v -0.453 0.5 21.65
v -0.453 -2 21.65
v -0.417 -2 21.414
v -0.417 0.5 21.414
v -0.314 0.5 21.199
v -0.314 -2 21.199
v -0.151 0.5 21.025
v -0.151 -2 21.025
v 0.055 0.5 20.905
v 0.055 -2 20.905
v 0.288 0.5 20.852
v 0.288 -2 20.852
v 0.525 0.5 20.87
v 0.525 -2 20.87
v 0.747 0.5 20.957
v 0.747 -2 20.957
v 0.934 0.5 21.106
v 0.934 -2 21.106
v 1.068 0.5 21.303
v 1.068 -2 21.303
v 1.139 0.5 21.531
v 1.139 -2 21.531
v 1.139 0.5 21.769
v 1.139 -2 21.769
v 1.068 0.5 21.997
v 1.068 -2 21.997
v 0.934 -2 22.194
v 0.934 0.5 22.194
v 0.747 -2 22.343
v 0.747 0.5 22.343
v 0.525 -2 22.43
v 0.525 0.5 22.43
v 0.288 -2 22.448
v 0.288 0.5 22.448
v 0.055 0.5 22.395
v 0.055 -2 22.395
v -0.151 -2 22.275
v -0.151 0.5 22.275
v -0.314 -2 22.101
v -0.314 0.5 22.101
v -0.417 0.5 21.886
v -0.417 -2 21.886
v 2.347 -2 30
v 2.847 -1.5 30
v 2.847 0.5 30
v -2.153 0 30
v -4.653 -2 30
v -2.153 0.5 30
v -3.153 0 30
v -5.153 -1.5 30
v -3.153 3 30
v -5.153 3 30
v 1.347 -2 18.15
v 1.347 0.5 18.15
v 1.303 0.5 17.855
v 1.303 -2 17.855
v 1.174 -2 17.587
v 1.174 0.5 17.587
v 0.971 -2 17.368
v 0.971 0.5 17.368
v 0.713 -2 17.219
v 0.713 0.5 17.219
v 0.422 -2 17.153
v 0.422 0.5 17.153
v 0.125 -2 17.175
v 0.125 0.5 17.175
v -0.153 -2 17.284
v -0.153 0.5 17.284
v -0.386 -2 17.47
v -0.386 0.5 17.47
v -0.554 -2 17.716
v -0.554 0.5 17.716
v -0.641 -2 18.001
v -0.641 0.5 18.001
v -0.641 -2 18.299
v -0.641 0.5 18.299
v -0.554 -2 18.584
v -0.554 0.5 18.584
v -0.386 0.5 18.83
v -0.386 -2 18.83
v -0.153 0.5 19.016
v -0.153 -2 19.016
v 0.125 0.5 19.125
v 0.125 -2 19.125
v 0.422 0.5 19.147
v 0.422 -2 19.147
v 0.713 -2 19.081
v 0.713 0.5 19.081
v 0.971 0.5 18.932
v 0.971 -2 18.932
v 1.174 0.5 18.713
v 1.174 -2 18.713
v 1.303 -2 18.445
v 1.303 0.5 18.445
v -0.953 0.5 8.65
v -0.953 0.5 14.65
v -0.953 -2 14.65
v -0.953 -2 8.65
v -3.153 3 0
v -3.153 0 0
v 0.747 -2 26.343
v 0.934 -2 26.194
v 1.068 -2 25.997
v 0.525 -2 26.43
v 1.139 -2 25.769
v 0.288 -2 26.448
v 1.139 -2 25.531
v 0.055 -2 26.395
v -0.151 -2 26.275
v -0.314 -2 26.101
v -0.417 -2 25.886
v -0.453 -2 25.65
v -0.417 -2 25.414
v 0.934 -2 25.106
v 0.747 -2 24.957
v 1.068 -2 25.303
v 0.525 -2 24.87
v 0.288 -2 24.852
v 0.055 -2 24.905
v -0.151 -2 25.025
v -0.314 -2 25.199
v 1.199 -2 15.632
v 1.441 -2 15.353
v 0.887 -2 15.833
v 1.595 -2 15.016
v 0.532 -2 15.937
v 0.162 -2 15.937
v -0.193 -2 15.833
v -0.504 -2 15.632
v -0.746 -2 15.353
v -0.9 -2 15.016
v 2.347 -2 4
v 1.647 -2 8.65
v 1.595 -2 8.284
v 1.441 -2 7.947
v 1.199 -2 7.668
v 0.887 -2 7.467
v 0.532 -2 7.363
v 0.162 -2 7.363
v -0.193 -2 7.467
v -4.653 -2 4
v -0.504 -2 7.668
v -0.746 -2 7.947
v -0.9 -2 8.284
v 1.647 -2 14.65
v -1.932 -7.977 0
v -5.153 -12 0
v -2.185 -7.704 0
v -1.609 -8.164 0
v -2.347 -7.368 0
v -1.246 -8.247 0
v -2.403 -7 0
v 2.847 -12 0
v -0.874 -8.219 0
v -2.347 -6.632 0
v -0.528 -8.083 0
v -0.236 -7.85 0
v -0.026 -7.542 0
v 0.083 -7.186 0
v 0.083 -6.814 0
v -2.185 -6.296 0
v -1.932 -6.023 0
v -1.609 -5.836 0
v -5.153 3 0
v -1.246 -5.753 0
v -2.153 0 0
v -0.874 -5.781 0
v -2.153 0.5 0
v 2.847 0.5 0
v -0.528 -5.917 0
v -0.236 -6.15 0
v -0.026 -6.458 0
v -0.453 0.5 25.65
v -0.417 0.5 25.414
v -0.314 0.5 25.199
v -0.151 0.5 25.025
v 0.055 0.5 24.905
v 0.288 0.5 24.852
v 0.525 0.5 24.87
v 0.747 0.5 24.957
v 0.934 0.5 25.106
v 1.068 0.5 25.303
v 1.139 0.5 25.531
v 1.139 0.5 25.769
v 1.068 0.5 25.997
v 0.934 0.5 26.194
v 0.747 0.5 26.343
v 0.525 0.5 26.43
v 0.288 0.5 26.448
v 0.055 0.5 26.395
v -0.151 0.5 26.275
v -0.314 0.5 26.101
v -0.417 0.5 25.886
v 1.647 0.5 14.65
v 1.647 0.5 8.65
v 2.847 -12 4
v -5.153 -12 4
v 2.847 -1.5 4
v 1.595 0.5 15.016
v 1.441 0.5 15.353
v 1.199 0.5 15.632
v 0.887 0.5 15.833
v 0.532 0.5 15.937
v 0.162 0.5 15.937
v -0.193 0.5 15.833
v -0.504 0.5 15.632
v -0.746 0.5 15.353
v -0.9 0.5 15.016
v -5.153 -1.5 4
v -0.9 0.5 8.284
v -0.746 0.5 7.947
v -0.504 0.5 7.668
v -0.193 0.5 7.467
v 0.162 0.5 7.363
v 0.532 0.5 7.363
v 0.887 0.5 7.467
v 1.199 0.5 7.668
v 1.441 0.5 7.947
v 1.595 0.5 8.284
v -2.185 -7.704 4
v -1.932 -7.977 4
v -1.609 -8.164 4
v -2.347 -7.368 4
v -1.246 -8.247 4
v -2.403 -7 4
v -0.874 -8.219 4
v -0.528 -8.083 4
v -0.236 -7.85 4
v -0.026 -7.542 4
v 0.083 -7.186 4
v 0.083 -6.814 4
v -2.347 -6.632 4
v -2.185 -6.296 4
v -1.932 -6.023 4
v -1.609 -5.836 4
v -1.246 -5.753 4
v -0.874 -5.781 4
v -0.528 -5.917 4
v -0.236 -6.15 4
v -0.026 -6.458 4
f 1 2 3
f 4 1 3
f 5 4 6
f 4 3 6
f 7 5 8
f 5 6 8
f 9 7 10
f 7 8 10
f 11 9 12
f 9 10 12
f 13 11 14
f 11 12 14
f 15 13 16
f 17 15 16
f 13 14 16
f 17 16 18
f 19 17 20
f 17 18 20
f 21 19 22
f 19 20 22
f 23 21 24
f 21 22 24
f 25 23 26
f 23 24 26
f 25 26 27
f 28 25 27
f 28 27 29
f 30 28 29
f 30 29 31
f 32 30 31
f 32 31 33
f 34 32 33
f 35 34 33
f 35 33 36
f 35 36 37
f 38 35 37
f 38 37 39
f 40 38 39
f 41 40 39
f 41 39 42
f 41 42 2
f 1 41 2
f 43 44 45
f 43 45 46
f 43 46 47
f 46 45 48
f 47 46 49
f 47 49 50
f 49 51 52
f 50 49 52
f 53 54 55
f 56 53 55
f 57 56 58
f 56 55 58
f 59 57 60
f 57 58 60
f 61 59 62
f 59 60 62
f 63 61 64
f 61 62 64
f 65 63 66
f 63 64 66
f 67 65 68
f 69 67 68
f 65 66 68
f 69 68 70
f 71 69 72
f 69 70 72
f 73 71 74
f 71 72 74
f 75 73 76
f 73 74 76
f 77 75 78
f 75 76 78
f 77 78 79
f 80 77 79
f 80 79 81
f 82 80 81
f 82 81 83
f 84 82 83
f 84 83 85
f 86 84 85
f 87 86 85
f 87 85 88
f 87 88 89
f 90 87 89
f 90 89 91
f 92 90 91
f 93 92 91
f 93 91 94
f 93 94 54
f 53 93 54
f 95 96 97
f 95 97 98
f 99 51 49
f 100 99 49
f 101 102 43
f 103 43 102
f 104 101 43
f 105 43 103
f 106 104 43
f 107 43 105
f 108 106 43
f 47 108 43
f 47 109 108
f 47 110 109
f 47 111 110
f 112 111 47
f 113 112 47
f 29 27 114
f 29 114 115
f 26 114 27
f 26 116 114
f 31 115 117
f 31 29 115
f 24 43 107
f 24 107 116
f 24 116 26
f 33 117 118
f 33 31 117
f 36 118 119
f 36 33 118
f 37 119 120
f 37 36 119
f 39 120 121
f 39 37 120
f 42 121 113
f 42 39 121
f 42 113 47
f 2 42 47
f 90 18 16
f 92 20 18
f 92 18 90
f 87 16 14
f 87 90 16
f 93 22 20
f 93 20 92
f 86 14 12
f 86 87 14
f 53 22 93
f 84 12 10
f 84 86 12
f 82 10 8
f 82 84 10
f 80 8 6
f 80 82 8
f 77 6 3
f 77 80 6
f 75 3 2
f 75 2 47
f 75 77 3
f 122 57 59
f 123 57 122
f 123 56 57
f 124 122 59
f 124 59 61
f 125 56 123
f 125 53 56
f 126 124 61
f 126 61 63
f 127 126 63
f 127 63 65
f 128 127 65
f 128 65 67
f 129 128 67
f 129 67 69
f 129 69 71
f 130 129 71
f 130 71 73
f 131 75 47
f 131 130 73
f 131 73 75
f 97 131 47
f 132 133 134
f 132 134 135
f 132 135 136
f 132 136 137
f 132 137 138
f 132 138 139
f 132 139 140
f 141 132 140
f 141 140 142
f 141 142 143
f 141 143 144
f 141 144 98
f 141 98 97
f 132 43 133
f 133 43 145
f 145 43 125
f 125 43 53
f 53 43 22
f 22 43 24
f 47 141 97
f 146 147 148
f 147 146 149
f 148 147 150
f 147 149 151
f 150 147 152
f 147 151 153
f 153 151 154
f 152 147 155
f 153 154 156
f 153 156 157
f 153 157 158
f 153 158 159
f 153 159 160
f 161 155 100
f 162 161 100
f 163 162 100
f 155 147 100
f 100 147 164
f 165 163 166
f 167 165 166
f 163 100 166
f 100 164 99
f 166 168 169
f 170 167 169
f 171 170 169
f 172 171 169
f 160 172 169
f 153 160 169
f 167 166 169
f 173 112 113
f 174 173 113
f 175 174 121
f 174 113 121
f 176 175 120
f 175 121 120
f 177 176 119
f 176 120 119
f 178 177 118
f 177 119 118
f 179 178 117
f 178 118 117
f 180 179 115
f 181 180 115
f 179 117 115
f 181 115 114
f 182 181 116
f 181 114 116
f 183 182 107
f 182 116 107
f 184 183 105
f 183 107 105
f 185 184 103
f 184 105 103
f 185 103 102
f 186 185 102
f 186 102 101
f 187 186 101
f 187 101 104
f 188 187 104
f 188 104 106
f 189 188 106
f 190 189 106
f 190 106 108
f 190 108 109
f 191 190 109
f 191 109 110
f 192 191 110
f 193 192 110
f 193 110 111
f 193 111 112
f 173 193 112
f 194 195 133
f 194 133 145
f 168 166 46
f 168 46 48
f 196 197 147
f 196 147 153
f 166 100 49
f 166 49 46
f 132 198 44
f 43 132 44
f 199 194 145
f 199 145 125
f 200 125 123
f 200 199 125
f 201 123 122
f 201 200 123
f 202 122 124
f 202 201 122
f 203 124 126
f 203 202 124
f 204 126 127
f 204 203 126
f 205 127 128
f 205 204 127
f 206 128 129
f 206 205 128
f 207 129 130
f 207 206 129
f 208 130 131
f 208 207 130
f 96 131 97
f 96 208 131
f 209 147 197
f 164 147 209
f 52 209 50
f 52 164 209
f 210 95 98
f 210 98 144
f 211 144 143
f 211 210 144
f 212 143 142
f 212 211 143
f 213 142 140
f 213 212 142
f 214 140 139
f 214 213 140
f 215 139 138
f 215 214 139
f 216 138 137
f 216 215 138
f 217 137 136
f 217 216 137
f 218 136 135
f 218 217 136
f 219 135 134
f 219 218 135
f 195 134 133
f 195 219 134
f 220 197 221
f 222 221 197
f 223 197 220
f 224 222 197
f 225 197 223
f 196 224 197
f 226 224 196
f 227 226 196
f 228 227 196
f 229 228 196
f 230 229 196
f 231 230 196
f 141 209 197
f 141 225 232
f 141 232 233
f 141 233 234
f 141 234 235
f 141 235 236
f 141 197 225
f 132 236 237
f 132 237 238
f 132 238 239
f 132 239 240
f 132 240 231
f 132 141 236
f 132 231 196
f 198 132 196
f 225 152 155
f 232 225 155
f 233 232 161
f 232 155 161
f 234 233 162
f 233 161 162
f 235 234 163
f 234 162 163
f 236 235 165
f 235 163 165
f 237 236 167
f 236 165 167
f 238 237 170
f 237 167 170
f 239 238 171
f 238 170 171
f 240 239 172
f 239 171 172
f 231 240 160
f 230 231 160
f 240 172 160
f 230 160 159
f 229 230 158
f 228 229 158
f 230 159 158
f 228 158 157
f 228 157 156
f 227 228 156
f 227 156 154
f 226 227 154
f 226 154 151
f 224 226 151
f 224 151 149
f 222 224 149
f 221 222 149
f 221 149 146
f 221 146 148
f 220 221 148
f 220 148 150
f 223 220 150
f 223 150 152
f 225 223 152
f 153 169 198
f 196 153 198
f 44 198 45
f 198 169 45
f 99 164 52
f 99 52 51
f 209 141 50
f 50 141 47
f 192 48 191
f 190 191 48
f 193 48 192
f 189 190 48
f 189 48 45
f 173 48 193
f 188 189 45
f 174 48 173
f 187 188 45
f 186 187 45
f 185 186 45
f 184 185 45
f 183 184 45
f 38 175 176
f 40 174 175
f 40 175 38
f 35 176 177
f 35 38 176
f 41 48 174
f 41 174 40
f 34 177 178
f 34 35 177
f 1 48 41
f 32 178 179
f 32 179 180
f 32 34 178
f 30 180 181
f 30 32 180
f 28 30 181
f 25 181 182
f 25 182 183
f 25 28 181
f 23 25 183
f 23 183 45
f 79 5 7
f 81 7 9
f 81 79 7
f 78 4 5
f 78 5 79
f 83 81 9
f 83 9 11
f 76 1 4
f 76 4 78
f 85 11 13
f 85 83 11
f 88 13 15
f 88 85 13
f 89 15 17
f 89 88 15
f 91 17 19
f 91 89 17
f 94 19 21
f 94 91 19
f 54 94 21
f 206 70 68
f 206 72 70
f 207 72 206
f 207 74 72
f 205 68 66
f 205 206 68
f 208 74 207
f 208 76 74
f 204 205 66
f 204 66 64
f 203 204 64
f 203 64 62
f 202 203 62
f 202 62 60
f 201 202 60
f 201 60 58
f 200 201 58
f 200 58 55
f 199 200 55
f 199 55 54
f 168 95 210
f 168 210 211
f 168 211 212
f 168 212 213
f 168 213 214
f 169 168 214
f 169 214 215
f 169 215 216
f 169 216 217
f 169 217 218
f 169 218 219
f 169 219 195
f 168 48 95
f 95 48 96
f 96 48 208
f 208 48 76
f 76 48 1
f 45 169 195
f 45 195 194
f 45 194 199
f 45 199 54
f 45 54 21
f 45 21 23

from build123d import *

# Parameters (mm, degrees)
BOSS_EXTRUDE1_DEPTH   = 30
SKETCH2_W             = 8
SKETCH2_H             = 4
BOSS_EXTRUDE2_DEPTH   = 10
SKETCH3_R             = 1
CUT_EXTRUDE1_DEPTH    = 10
M2_TAPPED_HOLE1_D     = 1.6
M2_TAPPED_HOLE1_DEPTH = 5.2
M2_TAPPED_HOLE1_TIP   = 0.480688495
M3_TAPPED_HOLE1_D     = 2.5
M3_TAPPED_HOLE1_DEPTH = 7.5
M3_TAPPED_HOLE1_TIP   = 0.751075774
CHAMFER1_SIZE         = 0.5


with BuildPart() as part:
    # Sketch1 → Boss-Extrude1 (new body)
    with BuildSketch(Plane.XY):
        Polygon((-5.152542373, 3), (-3.152542373, 3), (-3.152542373, 0), (-2.152542373, 0), (-2.152542373, 0.5), (2.847457627, 0.5), (2.847457627, -2), (-5.152542373, -2), align=None)
    extrude(amount=BOSS_EXTRUDE1_DEPTH)

    # Sketch2 → Boss-Extrude2 (add)
    with BuildSketch(Plane.XZ.offset(2)):
        with Locations((-1.152542373, 2)):
            Rectangle(SKETCH2_W, SKETCH2_H)
    extrude(amount=BOSS_EXTRUDE2_DEPTH)

    # Sketch3 → Cut-Extrude1 (cut)
    with BuildSketch(Plane(origin=(0, 0.5, 0), x_dir=(1, 0, 0), z_dir=(0, 1, 0))):
        with Locations((0.347457627, -18.15)):
            Circle(SKETCH3_R)
        with BuildLine():
            Line((-0.952542373, -14.65), (-0.952542373, -8.65))
            ThreePointArc((-0.952542373, -8.65), (0.347457627, -7.35), (1.647457627, -8.65))
            Line((1.647457627, -8.65), (1.647457627, -14.65))
            ThreePointArc((1.647457627, -14.65), (0.347457627, -15.95), (-0.952542373, -14.65))
        make_face()
    extrude(amount=-CUT_EXTRUDE1_DEPTH, mode=Mode.SUBTRACT)

    # M2 Tapped Hole1
    with Locations(Plane(origin=(0, 0.5, 0), x_dir=(1, 0, 0), z_dir=(0, 1, 0))):
        with Locations((0.347457627, -21.65), (0.347457627, -25.65)):
            Hole(M2_TAPPED_HOLE1_D / 2, depth=M2_TAPPED_HOLE1_DEPTH)
            with Locations((0, 0, -(M2_TAPPED_HOLE1_DEPTH + M2_TAPPED_HOLE1_TIP / 2))):  # 118° drill point
                Cone(0, M2_TAPPED_HOLE1_D / 2, M2_TAPPED_HOLE1_TIP, mode=Mode.SUBTRACT)

    # M3 Tapped Hole1
    with Locations(Plane.XY.offset(4)):
        with Locations((-1.152542373, -7)):
            Hole(M3_TAPPED_HOLE1_D / 2, depth=M3_TAPPED_HOLE1_DEPTH)
            with Locations((0, 0, -(M3_TAPPED_HOLE1_DEPTH + M3_TAPPED_HOLE1_TIP / 2))):  # 118° drill point
                Cone(0, M3_TAPPED_HOLE1_D / 2, M3_TAPPED_HOLE1_TIP, mode=Mode.SUBTRACT)

    # Chamfer1
    chamfer1_edges = [part.edges().sort_by_distance(p)[0] for p in [
        (2.847457627, -2, 17),
        (-5.152542373, -2, 17),
    ]]
    chamfer(chamfer1_edges, length=CHAMFER1_SIZE)


solid = part.part
